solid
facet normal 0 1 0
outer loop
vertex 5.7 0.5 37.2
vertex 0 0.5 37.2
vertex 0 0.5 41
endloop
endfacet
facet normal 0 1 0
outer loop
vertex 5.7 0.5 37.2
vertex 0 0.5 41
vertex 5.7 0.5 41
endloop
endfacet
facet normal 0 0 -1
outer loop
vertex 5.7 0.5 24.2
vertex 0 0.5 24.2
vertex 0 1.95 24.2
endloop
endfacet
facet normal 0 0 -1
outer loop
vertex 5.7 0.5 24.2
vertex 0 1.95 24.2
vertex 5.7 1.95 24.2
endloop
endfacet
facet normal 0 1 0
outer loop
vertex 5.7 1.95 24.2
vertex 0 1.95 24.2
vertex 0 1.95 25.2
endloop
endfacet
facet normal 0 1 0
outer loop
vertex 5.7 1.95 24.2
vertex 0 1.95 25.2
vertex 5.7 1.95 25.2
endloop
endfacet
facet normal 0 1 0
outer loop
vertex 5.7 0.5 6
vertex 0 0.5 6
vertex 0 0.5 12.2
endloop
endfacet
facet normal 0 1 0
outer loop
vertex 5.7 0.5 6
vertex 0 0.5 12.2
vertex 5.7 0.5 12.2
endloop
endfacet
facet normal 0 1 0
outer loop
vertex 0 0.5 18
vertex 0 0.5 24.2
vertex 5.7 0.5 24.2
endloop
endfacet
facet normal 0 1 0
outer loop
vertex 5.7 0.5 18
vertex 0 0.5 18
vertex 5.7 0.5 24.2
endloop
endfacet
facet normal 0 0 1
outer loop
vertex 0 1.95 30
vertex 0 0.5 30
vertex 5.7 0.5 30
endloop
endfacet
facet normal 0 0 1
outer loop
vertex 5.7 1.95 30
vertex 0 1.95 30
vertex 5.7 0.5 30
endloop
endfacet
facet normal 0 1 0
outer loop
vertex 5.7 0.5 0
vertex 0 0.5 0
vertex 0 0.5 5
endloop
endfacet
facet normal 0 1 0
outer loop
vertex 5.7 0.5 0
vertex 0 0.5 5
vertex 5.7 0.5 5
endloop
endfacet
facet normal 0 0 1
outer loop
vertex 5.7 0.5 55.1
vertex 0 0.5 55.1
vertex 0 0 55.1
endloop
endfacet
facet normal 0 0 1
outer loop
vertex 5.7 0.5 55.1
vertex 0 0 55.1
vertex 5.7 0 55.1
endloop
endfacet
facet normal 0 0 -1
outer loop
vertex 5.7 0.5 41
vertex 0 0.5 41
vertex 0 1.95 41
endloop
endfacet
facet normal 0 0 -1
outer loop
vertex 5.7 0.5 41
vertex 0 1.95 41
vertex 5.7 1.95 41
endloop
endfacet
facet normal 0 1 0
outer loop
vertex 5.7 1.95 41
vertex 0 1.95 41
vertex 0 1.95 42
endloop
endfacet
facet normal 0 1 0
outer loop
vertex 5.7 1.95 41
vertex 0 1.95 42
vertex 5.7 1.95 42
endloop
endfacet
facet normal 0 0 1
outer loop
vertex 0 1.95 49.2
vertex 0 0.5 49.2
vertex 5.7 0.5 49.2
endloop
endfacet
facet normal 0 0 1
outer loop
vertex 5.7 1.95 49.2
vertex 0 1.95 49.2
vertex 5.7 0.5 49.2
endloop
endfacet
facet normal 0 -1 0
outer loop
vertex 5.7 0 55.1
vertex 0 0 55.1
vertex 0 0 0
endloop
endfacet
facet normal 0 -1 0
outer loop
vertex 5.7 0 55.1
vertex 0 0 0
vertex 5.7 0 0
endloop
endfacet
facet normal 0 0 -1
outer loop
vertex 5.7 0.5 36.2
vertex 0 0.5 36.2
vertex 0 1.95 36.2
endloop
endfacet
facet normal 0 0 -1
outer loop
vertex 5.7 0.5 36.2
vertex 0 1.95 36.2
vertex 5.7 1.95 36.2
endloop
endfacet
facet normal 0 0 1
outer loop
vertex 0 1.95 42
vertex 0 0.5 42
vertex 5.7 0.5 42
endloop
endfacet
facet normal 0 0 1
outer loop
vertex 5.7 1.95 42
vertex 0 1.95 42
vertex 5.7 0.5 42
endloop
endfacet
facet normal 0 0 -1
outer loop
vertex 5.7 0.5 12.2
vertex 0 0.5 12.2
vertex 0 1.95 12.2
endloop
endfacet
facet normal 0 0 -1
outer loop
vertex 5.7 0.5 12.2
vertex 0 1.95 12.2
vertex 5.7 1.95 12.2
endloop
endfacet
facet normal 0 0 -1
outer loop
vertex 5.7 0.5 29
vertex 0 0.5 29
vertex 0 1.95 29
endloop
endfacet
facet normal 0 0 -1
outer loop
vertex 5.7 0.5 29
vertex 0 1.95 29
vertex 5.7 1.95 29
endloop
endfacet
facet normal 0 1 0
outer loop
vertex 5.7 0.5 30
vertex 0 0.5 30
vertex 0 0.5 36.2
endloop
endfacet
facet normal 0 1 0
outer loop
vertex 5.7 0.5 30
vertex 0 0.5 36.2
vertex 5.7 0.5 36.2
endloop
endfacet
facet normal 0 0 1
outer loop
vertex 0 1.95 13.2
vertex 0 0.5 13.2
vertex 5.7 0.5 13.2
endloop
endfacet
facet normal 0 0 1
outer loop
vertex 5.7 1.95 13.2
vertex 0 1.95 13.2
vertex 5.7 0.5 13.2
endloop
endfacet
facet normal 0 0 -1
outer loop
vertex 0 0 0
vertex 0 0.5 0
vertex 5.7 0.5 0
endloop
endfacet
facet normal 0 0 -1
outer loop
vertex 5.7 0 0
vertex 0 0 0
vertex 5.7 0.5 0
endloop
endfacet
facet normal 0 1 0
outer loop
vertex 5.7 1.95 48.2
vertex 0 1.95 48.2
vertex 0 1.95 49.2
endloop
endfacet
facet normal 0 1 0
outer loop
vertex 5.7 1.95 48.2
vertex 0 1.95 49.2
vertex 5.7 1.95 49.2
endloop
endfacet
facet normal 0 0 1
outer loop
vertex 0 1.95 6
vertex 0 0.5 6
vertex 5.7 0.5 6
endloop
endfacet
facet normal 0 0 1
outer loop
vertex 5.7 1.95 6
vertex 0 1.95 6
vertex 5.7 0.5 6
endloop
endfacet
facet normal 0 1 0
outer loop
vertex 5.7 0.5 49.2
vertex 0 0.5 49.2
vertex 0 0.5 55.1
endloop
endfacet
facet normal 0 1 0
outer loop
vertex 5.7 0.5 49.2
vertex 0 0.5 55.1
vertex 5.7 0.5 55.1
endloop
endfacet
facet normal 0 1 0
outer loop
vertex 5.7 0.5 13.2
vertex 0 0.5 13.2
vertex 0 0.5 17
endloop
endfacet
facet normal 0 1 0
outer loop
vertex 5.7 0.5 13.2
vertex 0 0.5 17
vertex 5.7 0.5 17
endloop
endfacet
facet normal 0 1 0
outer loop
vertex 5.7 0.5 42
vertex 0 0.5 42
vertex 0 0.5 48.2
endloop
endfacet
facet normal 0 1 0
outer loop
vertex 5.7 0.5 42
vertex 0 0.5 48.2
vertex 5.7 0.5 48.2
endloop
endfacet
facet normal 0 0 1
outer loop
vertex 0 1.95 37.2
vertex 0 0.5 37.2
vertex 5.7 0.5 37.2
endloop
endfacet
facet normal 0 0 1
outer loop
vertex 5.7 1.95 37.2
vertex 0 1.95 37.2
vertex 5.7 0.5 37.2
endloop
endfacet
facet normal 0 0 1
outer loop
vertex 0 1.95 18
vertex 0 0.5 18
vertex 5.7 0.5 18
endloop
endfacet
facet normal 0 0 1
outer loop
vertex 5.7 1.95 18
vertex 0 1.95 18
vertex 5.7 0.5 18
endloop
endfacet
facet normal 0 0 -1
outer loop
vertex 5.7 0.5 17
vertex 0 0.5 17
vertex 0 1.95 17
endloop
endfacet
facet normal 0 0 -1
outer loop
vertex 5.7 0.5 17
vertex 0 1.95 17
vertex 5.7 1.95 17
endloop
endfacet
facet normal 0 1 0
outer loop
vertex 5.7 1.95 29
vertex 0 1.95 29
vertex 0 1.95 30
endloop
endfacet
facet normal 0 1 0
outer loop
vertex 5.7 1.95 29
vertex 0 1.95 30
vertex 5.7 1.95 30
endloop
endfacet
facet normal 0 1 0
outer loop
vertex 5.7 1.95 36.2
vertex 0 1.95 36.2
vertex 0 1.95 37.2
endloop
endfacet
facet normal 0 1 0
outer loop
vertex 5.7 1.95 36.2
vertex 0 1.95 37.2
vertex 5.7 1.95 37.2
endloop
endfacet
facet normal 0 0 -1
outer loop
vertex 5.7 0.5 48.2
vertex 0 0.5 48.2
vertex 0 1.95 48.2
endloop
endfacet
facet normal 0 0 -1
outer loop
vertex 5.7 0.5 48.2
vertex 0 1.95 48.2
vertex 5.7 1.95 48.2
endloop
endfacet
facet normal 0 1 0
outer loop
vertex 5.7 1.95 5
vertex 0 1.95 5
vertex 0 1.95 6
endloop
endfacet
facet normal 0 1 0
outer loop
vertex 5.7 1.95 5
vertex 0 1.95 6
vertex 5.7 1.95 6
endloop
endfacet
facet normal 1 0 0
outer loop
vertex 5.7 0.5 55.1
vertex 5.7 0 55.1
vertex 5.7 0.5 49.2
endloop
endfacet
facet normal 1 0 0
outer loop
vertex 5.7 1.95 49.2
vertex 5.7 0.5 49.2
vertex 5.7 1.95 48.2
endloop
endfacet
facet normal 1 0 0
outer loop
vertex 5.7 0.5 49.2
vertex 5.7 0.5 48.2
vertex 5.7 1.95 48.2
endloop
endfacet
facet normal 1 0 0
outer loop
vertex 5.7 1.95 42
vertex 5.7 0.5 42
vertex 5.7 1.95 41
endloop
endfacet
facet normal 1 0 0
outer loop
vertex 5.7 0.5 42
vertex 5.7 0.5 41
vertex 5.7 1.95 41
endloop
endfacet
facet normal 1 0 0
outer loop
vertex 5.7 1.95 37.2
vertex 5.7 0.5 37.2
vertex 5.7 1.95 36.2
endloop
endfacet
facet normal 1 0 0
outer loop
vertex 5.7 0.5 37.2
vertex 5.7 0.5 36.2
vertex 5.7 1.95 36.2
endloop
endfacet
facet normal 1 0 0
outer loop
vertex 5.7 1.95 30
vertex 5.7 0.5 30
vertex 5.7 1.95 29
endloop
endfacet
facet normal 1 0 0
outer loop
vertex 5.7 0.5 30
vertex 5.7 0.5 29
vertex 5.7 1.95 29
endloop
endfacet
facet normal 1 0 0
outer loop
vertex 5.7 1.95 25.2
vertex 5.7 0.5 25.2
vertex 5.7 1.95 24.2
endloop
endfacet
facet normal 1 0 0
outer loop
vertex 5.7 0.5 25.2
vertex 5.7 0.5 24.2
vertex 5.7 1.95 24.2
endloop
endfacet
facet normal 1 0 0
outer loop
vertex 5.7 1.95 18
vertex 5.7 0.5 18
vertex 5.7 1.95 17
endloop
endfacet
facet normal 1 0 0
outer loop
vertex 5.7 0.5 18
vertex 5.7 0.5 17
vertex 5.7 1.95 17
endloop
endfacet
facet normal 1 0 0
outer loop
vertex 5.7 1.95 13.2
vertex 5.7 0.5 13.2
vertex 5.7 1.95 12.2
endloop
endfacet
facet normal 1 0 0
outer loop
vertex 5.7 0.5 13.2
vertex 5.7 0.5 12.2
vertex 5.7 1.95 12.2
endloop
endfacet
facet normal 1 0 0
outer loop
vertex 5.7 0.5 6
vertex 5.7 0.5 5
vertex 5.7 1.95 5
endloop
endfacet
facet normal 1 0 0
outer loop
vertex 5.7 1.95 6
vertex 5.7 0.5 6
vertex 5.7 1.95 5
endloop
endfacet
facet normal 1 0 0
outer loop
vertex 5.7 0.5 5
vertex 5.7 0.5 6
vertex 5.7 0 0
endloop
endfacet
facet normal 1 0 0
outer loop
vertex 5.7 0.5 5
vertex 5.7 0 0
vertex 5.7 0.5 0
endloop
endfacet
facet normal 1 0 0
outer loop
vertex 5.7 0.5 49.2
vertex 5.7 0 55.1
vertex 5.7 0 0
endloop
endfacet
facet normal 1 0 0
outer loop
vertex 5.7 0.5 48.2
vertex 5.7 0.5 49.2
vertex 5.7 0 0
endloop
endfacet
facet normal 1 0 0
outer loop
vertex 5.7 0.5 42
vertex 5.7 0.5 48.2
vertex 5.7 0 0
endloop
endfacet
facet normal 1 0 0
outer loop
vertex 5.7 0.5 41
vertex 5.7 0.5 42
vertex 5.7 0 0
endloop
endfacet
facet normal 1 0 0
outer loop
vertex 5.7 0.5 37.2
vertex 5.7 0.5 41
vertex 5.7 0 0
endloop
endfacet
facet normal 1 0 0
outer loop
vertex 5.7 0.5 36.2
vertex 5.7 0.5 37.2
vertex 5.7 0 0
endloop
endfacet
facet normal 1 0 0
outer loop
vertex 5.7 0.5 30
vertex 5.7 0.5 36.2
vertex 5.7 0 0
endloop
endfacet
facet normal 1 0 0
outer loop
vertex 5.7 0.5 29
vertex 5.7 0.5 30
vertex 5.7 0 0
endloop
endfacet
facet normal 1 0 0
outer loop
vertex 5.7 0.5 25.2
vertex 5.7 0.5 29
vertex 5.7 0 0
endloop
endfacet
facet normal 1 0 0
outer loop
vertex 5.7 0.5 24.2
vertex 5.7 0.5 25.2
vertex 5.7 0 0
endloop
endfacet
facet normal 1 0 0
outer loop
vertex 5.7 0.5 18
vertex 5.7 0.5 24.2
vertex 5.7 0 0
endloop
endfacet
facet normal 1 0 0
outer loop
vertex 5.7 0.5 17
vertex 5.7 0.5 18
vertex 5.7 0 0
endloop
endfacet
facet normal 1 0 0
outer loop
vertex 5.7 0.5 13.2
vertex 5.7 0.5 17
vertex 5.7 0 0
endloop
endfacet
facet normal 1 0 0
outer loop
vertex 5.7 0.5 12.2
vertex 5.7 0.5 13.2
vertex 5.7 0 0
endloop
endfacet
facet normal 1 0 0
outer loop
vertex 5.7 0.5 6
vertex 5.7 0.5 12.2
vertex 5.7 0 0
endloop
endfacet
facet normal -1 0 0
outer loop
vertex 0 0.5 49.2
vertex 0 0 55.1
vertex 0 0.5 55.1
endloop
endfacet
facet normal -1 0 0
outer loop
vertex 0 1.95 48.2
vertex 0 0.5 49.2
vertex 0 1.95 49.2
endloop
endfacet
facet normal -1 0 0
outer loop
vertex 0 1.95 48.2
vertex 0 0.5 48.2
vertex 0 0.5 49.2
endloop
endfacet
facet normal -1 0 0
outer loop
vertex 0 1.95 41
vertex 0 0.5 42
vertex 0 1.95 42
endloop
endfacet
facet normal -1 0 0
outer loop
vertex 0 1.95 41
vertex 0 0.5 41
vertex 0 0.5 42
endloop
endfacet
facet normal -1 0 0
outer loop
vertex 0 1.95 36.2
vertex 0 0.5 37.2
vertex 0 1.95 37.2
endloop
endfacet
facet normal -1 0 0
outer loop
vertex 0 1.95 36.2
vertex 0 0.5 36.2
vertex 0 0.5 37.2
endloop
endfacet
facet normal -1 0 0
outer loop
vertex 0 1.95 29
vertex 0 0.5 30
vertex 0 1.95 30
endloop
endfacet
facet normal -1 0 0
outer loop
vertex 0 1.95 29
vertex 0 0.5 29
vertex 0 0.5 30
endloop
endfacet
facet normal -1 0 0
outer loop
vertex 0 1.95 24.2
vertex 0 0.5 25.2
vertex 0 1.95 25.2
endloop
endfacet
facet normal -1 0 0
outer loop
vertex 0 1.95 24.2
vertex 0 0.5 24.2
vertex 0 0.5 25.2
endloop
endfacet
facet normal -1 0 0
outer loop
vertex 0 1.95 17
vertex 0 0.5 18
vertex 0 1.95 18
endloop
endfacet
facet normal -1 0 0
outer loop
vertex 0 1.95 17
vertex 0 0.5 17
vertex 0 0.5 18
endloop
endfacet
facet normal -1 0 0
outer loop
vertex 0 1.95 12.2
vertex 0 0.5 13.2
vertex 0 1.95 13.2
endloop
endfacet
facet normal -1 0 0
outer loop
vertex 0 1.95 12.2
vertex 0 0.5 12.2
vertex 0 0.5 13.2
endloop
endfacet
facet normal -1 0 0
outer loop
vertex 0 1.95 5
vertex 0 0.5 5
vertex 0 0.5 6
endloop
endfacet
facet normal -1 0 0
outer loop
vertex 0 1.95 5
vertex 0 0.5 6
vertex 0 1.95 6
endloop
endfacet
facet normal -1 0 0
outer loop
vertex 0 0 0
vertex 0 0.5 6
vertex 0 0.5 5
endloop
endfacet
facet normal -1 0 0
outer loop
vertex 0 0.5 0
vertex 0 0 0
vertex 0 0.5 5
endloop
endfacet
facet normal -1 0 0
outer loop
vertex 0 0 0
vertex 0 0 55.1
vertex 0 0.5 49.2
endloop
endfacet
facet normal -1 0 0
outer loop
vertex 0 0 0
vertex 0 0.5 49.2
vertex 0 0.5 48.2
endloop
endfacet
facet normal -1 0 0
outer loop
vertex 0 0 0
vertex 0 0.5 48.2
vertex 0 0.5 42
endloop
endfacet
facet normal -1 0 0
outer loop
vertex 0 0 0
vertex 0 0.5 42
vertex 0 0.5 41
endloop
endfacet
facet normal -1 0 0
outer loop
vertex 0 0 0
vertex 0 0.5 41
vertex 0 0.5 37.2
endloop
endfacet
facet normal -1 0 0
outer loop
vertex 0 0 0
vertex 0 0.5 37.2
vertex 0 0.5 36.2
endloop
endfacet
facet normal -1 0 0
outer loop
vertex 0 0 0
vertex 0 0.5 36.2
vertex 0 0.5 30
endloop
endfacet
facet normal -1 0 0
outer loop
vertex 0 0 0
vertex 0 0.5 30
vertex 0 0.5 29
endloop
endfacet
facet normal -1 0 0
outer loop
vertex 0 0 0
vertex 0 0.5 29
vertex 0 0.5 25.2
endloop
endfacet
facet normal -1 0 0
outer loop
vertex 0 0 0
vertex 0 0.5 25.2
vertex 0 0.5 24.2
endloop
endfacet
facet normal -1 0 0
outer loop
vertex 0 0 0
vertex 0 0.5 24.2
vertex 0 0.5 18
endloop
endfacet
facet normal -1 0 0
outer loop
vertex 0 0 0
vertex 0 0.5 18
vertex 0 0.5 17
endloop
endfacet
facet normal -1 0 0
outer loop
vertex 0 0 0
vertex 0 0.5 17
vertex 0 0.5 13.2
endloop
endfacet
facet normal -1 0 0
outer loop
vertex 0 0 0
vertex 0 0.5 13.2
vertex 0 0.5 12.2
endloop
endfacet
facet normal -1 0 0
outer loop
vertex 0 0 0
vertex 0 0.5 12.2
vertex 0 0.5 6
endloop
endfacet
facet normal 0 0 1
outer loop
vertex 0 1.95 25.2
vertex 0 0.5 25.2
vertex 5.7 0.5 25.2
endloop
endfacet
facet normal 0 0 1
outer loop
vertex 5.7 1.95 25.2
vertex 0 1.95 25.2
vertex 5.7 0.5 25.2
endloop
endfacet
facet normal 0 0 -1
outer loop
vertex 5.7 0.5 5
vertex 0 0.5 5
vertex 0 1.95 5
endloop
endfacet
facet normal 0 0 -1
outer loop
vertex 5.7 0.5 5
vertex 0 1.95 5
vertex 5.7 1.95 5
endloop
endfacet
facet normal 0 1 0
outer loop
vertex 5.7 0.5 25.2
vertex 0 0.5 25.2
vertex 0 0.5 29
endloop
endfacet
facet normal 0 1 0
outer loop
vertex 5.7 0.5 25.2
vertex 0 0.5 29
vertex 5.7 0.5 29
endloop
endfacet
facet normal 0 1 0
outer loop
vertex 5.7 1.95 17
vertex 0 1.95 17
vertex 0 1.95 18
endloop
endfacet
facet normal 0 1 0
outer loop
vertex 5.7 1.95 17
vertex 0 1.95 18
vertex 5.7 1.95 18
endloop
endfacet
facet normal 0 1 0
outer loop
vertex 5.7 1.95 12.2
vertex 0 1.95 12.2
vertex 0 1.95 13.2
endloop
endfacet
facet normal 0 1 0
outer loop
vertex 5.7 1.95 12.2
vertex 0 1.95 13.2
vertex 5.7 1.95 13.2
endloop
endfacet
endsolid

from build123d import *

# Parameters (mm, degrees)
SKETCH2_W           = 5.7
SKETCH2_H           = 0.5
BOSS_EXTRUDE1_DEPTH = 55.1
SKETCH3_W           = 5.7
SKETCH3_H           = 1
BOSS_EXTRUDE2_DEPTH = 1.45
LPATTERN1_COUNT     = 4
LPATTERN1_PITCH     = 12


with BuildPart() as part:
    # Sketch2 → Boss-Extrude1 (new body)
    with BuildSketch(Plane.XY):
        with Locations((2.85, 0.25)):
            Rectangle(SKETCH2_W, SKETCH2_H)
    extrude(amount=BOSS_EXTRUDE1_DEPTH)

    # Sketch3 → Boss-Extrude2 (add)
    with BuildSketch(Plane(origin=(0, 0.5, 0), x_dir=(1, 0, 0), z_dir=(0, 1, 0))):
        with Locations((2.85, -5.5)):
            Rectangle(SKETCH3_W, SKETCH3_H)
        with Locations((2.85, -12.7)):
            Rectangle(SKETCH3_W, SKETCH3_H)
    boss_extrude2 = extrude(amount=BOSS_EXTRUDE2_DEPTH)

    # LPattern1: Boss-Extrude2 ×4
    with Locations(*[(0, 0, i * LPATTERN1_PITCH) for i in range(1, LPATTERN1_COUNT)]):
        add(boss_extrude2)


solid = part.part
